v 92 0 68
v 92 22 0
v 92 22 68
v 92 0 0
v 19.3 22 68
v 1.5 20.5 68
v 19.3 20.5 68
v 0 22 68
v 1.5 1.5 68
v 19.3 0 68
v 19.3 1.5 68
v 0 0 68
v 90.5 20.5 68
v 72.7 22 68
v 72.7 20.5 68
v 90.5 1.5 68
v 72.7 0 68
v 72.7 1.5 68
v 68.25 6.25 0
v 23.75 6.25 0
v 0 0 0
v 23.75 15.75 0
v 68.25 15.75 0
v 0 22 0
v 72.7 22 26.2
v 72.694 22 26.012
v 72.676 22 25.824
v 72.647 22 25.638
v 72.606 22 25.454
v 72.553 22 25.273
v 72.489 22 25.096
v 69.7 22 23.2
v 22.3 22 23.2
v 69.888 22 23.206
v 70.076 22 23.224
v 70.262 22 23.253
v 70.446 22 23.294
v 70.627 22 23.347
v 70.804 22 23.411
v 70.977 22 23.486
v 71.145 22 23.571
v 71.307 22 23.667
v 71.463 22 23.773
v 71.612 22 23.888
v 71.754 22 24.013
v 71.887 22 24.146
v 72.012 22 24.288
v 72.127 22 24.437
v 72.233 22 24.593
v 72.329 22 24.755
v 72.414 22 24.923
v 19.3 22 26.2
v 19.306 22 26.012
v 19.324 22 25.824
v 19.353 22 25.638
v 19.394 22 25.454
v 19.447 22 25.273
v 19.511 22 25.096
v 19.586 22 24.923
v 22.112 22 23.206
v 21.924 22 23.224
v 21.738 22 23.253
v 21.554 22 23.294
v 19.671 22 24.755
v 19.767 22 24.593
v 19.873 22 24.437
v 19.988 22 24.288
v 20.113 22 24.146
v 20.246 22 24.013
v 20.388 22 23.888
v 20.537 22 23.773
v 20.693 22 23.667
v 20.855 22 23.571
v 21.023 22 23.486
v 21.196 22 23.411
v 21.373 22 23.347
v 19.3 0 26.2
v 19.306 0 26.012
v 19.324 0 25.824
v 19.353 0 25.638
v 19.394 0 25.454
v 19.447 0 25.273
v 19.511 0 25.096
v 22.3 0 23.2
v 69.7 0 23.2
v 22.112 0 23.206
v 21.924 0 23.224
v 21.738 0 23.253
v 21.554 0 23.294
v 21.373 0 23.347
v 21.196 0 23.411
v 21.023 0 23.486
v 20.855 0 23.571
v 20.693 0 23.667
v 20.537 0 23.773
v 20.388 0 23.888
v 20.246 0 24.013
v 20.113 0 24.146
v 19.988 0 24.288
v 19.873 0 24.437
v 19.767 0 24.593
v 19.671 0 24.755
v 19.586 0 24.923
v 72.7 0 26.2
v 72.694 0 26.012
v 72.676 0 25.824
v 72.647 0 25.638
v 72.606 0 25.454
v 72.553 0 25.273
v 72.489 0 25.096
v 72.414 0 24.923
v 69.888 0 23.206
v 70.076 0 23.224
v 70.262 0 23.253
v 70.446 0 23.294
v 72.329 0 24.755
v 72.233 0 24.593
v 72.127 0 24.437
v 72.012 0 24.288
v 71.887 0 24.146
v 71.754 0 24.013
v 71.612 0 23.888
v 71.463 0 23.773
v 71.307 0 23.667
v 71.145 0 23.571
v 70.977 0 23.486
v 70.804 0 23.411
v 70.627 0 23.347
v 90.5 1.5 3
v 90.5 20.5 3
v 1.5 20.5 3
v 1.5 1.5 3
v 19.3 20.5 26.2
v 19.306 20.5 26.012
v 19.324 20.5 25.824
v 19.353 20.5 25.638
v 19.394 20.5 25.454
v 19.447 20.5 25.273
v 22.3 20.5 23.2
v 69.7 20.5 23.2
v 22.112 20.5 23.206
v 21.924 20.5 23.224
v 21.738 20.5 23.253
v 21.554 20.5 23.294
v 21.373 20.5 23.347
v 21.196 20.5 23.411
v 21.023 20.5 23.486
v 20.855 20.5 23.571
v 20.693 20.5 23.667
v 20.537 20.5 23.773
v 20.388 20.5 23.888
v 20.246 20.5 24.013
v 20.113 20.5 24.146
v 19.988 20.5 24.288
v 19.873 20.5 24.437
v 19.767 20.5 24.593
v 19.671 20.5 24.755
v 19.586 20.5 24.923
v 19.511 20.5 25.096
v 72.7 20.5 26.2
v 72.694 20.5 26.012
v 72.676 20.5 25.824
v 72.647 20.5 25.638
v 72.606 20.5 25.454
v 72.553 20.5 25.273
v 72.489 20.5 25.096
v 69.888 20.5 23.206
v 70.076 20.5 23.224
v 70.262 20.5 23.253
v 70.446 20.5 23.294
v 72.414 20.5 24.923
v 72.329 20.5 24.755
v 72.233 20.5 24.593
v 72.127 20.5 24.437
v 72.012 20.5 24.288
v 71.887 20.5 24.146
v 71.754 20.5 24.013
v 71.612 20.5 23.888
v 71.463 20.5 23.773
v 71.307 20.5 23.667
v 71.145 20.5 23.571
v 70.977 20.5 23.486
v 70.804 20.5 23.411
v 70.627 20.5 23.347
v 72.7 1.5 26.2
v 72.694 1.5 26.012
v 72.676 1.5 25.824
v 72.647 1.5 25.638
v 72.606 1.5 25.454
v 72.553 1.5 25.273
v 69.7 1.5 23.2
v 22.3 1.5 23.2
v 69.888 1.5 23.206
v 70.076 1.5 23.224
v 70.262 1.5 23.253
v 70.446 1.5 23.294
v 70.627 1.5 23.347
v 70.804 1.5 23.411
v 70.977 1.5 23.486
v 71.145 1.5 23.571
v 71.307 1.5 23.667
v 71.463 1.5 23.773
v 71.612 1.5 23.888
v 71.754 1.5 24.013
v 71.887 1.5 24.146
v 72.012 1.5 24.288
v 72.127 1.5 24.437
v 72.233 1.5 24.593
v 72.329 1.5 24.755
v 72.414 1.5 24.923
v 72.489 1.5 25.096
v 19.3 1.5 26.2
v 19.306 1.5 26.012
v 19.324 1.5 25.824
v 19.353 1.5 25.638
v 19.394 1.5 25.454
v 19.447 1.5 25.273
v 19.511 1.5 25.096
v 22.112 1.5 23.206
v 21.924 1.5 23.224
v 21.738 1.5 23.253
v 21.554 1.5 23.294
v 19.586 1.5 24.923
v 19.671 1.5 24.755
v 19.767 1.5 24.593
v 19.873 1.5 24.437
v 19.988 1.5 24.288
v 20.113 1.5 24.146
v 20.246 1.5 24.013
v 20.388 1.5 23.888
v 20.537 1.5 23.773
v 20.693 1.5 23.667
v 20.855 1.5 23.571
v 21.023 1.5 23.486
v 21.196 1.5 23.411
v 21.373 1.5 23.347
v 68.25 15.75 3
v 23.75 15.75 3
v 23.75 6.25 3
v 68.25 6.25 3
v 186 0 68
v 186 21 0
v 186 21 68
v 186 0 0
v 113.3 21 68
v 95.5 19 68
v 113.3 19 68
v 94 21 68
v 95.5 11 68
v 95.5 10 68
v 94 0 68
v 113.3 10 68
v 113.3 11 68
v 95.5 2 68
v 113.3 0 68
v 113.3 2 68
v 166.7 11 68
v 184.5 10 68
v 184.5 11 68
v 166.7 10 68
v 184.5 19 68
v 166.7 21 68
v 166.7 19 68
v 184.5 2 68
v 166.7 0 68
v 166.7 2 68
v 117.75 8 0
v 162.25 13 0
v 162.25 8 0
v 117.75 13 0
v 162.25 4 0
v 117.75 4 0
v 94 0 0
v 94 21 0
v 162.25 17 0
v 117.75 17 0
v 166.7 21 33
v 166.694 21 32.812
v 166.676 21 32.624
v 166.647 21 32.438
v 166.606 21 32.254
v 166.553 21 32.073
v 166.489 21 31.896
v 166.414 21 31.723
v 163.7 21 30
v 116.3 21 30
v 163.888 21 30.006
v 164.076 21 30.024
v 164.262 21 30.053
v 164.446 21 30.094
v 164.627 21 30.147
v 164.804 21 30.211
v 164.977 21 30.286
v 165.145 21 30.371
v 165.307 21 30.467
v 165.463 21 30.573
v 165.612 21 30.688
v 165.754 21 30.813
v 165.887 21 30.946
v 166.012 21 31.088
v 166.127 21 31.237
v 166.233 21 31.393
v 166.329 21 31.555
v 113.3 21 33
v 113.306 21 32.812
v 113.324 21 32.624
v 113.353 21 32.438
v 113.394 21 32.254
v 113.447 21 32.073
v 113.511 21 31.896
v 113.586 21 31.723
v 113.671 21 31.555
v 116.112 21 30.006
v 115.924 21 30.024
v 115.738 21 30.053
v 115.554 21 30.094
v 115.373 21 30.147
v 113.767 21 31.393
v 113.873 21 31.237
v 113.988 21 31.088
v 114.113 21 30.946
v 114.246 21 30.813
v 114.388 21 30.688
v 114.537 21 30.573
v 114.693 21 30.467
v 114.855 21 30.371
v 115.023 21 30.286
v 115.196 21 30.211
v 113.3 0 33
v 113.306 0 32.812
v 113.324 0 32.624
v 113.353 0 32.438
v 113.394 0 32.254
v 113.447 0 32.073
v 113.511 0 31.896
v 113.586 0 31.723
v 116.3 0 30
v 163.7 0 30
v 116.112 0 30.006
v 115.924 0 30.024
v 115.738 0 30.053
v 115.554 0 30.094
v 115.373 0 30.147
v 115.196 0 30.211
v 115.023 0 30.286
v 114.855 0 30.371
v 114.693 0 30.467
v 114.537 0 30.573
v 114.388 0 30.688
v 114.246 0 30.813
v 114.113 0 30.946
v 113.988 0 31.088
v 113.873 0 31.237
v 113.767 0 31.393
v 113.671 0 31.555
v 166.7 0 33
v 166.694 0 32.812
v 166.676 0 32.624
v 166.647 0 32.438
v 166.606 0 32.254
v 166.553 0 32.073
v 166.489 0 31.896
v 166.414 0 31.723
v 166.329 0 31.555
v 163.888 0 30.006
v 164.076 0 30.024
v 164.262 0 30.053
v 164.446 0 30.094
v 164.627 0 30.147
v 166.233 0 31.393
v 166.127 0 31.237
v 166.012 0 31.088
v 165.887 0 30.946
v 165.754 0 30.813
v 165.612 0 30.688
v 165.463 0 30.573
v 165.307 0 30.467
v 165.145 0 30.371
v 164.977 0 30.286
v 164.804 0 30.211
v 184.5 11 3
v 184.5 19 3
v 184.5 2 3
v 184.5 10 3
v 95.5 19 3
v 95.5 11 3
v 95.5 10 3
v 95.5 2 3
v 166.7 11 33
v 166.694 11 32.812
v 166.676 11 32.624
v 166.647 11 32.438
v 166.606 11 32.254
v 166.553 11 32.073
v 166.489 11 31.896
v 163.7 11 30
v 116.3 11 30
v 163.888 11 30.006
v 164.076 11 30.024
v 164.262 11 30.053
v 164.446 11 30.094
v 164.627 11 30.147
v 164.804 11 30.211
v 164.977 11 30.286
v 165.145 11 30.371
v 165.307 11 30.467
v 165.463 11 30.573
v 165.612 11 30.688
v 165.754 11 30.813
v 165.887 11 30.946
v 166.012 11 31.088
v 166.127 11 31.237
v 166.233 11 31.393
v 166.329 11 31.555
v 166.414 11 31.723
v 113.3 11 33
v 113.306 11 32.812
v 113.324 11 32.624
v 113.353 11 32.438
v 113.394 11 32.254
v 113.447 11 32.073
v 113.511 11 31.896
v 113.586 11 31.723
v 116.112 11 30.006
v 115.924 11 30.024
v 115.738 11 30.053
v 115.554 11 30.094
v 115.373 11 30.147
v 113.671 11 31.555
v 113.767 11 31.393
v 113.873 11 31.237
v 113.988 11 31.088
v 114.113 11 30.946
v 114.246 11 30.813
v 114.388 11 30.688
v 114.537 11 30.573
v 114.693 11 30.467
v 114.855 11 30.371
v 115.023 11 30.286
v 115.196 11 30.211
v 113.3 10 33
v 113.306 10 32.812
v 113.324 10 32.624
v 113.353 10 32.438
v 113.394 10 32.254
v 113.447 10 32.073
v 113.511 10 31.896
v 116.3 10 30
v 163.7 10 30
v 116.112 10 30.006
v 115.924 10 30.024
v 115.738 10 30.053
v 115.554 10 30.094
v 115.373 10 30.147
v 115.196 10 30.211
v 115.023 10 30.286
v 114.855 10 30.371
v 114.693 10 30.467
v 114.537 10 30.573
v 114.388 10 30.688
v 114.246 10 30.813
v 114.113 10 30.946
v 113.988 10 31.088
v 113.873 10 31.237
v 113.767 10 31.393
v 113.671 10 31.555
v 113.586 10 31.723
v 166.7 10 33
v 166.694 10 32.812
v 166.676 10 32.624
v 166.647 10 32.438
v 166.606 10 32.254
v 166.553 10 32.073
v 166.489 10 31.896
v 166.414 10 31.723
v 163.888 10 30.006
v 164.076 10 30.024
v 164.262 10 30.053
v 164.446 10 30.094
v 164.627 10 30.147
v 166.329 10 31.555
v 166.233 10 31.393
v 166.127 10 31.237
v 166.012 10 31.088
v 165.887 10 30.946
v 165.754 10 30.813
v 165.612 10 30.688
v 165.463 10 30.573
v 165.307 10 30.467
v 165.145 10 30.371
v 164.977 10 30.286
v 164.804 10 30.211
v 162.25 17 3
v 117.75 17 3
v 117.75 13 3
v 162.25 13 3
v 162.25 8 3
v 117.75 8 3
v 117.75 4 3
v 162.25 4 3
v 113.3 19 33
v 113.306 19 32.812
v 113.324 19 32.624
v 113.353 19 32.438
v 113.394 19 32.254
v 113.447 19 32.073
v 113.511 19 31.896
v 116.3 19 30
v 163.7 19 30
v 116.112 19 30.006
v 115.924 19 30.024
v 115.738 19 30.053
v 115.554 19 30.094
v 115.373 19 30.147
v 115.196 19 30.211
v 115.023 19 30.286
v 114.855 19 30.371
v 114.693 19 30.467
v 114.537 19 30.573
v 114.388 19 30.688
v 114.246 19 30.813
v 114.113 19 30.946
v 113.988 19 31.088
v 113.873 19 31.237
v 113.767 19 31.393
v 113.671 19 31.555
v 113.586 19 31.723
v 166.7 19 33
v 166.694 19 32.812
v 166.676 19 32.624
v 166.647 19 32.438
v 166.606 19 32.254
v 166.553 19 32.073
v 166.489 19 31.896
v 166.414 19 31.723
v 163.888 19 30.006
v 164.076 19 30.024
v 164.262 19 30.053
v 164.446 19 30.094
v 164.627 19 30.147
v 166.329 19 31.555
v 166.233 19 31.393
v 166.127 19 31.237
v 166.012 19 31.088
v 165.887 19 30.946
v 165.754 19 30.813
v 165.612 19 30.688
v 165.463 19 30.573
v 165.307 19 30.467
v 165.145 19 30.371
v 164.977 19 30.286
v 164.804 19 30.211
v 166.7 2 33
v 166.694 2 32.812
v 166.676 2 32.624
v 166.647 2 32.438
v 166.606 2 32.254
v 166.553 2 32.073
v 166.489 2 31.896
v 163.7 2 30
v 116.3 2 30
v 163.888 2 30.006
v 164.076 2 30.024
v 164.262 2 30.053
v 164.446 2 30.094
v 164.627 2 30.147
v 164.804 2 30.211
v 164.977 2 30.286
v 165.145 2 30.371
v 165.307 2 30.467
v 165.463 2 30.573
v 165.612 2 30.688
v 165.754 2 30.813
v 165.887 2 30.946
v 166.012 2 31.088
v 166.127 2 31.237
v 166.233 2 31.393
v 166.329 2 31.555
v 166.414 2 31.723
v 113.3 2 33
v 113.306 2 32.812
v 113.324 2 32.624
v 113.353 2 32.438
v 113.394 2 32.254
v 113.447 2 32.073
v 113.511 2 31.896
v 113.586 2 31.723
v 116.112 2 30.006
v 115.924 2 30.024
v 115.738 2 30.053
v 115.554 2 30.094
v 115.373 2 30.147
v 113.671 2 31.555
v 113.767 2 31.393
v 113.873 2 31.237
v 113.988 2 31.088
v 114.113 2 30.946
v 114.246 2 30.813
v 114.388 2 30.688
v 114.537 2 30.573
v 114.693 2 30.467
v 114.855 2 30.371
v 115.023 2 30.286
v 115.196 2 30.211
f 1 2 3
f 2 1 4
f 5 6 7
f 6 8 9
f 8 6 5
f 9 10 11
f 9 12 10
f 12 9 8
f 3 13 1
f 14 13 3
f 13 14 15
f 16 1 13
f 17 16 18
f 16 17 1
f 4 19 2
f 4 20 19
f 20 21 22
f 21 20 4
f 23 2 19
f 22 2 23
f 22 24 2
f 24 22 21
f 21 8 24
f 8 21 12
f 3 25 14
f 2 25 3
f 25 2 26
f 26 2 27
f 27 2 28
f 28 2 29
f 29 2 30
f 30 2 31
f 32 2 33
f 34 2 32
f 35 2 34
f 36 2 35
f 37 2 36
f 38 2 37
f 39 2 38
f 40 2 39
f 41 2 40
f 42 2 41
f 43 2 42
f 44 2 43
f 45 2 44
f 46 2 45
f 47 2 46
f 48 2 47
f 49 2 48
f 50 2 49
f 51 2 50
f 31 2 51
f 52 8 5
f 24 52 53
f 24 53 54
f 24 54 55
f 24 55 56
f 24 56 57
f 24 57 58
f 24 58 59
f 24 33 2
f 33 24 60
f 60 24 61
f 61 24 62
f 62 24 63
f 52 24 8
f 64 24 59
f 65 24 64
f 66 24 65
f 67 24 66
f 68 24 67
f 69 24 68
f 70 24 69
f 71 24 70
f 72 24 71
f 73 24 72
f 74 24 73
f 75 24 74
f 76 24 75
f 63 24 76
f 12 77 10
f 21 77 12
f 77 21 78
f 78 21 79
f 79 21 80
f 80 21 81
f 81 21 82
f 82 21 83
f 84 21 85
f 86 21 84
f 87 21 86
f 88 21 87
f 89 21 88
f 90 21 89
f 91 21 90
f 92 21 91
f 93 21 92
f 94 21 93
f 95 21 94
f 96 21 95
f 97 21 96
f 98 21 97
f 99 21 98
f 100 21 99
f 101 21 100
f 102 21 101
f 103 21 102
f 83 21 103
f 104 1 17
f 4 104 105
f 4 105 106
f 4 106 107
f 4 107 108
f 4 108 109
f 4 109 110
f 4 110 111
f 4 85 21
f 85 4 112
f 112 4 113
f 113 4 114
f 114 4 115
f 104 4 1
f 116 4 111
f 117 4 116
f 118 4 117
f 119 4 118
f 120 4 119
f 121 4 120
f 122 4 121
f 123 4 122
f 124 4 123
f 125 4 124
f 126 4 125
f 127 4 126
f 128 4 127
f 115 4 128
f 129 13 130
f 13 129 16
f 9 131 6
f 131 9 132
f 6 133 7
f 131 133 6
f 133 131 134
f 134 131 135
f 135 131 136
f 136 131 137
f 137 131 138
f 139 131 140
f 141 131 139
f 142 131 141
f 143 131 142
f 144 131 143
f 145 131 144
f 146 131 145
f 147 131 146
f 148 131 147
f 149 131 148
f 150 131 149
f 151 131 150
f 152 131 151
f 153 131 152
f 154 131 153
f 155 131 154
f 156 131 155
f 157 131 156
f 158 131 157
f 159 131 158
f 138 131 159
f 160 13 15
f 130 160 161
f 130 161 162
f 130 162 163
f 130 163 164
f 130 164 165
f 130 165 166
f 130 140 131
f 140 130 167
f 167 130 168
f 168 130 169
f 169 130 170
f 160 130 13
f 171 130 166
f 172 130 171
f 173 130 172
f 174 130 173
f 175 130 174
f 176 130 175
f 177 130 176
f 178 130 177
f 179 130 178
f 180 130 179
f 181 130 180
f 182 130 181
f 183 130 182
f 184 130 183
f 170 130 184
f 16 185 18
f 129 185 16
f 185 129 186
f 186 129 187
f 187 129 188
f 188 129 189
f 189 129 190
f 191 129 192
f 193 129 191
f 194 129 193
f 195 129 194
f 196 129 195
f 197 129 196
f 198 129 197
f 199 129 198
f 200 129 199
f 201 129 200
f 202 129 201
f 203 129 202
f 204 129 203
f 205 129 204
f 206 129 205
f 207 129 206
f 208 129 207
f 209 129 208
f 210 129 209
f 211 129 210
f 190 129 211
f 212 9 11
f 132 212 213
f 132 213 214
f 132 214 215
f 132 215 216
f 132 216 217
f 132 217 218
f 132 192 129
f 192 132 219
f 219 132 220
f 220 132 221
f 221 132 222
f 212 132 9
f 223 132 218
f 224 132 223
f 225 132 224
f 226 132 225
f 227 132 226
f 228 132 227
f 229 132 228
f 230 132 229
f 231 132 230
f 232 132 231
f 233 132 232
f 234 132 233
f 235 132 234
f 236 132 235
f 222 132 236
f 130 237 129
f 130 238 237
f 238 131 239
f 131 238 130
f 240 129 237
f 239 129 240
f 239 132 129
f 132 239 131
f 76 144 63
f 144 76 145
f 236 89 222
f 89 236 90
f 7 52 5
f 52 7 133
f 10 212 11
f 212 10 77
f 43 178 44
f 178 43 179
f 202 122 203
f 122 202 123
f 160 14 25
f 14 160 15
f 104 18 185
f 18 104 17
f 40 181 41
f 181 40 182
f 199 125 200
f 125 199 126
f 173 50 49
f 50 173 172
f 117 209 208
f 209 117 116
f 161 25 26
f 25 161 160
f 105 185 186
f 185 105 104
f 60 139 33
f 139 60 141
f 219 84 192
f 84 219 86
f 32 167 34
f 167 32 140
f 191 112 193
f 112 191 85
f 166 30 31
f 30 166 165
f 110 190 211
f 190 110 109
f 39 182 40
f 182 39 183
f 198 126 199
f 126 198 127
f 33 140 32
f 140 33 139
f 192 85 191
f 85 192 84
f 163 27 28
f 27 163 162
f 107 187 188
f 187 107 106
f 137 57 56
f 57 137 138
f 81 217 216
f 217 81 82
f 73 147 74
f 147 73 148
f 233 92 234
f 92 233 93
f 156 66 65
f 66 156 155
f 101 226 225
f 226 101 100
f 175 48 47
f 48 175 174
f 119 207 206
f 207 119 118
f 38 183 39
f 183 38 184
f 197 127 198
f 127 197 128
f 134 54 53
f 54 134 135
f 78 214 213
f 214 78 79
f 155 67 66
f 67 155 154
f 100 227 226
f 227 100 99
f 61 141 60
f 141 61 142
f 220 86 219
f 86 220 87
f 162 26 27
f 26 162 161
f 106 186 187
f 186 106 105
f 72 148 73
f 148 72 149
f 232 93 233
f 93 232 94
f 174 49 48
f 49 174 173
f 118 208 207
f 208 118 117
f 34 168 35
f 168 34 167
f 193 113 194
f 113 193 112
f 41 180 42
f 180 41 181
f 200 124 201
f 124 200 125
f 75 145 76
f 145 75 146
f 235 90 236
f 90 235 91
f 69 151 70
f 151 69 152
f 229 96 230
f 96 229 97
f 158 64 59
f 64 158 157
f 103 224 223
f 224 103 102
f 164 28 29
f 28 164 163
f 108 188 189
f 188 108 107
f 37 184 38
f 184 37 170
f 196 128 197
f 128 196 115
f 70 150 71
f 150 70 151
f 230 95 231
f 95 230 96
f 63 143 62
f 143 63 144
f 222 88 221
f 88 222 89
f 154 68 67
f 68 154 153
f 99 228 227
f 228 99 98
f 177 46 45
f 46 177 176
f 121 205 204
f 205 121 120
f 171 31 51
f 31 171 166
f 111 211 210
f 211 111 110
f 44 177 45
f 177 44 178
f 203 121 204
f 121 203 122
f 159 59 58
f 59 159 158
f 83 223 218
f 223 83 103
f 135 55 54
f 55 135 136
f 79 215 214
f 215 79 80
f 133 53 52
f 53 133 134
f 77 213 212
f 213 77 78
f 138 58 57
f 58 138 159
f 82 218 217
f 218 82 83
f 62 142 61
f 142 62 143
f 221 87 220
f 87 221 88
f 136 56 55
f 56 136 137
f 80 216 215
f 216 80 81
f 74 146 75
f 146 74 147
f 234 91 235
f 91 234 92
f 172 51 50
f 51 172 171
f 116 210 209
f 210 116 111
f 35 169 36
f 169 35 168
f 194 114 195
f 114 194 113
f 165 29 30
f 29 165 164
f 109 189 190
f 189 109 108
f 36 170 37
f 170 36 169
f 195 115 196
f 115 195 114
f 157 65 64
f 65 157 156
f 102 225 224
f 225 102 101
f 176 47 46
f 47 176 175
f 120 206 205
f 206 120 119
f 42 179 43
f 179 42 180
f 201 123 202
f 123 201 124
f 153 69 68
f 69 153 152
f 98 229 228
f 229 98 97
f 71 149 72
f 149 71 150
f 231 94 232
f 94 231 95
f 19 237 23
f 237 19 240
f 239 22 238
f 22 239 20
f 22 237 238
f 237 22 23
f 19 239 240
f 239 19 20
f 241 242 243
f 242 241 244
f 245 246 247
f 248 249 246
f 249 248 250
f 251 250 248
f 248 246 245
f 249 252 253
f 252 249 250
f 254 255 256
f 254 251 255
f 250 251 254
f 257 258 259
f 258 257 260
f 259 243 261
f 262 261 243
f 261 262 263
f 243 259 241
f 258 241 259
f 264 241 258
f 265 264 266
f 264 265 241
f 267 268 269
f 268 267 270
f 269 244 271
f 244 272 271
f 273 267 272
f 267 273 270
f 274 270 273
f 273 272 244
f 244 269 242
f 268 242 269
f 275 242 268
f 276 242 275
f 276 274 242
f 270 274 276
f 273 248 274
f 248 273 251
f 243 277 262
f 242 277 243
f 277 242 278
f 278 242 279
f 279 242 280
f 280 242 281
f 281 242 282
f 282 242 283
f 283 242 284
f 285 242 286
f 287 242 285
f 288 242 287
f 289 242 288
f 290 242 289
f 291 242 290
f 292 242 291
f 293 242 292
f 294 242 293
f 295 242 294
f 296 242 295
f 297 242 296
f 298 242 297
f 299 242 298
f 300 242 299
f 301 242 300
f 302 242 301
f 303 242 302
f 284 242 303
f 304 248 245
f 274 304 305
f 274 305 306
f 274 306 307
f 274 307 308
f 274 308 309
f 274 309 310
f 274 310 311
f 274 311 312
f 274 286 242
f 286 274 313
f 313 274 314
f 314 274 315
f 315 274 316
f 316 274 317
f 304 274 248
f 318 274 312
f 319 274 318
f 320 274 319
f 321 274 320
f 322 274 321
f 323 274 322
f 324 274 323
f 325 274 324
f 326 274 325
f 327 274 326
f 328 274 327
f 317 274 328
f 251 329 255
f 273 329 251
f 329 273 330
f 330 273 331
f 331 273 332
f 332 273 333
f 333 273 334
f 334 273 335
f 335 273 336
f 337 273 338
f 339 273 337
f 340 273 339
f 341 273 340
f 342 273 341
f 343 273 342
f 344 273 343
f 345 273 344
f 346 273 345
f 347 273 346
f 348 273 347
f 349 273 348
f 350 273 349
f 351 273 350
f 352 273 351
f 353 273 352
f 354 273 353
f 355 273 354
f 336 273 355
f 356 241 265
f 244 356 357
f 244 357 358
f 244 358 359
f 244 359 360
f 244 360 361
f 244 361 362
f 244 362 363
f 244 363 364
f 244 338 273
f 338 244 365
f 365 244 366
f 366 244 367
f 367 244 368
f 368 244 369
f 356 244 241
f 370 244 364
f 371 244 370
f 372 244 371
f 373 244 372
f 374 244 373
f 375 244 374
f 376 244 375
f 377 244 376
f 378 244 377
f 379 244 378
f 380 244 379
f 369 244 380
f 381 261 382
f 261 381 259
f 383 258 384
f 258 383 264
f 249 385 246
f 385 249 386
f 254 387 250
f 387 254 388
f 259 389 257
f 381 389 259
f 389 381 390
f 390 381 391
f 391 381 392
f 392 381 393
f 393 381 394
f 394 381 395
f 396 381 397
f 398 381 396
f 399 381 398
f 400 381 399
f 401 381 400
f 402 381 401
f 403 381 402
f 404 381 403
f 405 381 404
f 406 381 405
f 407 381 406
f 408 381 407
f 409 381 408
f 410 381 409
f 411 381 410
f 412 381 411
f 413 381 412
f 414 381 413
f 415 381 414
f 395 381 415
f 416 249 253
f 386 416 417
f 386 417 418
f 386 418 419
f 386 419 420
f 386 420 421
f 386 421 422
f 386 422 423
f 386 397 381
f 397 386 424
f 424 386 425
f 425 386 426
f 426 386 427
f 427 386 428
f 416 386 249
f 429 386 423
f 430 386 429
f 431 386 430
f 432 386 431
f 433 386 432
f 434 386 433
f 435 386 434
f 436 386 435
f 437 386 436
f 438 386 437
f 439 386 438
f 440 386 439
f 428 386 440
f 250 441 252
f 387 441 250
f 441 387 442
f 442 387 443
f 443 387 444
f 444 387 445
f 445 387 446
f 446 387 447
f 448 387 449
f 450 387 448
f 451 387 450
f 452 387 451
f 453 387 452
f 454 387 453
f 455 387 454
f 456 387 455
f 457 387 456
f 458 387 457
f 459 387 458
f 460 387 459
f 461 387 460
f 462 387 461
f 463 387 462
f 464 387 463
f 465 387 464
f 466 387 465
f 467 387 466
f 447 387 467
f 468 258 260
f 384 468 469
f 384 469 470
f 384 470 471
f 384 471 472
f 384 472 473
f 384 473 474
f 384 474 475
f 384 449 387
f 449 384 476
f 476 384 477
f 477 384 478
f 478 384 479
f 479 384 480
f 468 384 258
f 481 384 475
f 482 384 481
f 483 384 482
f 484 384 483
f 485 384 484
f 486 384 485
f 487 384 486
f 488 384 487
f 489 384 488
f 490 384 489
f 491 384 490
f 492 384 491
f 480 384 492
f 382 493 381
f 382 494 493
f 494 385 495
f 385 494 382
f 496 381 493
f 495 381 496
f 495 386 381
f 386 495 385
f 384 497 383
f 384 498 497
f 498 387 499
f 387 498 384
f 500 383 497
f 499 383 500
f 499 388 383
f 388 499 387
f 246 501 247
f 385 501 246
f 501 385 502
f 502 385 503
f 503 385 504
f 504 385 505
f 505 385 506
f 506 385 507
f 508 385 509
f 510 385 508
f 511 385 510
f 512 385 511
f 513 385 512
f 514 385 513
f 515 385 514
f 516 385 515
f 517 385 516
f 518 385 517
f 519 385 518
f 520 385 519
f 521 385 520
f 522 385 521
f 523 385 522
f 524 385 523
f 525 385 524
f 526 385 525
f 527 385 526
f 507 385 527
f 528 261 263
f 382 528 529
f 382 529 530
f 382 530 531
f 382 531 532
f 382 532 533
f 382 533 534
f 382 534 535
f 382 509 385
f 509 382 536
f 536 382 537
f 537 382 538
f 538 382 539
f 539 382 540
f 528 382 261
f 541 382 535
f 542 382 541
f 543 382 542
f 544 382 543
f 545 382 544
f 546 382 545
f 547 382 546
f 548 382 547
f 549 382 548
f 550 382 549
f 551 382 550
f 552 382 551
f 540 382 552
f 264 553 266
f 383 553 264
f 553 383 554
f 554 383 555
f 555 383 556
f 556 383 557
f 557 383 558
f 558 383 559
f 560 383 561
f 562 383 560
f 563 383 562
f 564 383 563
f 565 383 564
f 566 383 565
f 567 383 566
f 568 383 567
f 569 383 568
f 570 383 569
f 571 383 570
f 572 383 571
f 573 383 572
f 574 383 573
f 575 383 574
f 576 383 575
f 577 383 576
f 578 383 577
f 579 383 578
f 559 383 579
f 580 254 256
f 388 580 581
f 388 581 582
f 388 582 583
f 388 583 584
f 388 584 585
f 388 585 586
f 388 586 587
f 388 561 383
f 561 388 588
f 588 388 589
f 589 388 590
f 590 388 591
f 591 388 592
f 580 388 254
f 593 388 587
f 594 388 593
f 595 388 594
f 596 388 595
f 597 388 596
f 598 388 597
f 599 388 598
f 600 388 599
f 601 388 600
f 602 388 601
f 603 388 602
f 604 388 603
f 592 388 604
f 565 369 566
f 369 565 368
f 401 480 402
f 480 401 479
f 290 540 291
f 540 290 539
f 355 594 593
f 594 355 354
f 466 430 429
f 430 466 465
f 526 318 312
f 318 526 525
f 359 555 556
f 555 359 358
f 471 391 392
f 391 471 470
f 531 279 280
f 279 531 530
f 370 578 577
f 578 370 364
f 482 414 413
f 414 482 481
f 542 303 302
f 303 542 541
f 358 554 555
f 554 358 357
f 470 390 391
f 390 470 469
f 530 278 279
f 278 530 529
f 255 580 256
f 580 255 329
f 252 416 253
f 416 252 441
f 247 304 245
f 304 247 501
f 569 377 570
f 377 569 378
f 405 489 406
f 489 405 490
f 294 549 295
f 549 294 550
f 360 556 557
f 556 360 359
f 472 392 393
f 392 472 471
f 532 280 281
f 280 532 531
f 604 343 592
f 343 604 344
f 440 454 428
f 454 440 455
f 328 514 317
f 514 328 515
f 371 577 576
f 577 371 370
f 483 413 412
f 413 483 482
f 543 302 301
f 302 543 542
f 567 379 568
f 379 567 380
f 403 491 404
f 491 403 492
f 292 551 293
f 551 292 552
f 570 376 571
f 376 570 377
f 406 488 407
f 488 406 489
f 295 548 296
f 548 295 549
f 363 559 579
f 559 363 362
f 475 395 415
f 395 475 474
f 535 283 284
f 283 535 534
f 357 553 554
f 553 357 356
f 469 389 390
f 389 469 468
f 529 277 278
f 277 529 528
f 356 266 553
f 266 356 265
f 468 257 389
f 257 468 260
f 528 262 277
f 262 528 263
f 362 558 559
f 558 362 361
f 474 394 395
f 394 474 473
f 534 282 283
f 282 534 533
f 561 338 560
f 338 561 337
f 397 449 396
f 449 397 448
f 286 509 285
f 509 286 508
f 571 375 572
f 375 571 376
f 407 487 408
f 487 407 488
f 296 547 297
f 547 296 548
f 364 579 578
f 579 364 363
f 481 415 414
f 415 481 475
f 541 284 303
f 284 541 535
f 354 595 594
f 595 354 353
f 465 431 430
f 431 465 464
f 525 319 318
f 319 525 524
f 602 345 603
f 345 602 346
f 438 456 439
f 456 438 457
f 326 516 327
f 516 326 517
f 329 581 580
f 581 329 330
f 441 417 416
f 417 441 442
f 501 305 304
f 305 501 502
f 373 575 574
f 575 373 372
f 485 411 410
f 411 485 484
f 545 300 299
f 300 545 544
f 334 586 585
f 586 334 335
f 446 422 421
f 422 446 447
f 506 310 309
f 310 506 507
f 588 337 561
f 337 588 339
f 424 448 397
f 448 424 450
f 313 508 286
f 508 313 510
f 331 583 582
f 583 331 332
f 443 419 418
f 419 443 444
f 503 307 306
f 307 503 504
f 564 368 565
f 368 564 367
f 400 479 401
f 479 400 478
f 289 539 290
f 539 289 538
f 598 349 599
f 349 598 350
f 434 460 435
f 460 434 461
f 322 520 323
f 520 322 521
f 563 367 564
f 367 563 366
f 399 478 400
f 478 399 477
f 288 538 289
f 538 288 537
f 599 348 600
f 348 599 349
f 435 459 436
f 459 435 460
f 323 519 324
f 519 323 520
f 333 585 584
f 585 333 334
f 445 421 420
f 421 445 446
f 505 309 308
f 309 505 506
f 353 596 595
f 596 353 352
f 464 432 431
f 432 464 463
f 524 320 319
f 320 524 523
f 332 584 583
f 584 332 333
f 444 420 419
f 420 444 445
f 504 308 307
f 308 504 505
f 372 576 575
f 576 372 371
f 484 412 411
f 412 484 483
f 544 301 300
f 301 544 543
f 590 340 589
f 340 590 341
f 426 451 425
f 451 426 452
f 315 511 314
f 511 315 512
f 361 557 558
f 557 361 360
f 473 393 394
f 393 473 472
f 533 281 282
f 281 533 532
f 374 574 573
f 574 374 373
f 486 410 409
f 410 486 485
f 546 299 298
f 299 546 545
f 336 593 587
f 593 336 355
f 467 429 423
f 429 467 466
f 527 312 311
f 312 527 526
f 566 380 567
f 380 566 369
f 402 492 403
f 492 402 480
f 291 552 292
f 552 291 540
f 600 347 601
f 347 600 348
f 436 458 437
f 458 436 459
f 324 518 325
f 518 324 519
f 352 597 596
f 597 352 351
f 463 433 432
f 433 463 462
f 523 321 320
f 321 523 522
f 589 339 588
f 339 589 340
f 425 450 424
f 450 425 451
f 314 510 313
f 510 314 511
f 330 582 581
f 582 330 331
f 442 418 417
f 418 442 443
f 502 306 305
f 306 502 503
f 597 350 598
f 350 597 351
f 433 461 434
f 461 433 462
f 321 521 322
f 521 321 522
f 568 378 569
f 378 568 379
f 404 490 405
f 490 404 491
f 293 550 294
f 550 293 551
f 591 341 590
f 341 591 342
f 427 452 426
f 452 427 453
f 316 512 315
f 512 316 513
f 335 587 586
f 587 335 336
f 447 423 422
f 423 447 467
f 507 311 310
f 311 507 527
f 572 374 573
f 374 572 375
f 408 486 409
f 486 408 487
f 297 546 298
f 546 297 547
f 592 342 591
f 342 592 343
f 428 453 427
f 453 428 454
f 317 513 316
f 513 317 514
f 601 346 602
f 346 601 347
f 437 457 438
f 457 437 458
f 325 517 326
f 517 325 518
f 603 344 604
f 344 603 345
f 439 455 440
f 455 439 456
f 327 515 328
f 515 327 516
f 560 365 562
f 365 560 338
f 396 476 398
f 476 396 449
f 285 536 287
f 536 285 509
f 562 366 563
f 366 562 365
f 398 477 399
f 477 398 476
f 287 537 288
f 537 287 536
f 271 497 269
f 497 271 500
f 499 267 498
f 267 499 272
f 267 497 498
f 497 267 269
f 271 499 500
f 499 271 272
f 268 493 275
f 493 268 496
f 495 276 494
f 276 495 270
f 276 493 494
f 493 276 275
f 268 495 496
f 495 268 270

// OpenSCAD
include <lib/boardgame_insert_toolkit_lib.2.scad>;

// determines whether lids are output.
g_b_print_lid = true;

// determines whether boxes are output.
g_b_print_box = true; 

// Focus on one box
g_isolated_print_box = ""; 

// Used to visualize how all of the boxes fit together. 
g_b_visualization = false;          
        
// this is the outer wall thickness. 
//Default = 1.5mm
g_wall_thickness = 1.5;

// The tolerance value is extra space put between planes of the lid and box that fit together.
// Increase the tolerance to loosen the fit and decrease it to tighten it.
//
// Note that the tolerance is applied exclusively to the lid.
// So if the lid is too tight or too loose, change this value ( up for looser fit, down for tighter fit ) and 
// you only need to reprint the lid.
// 
// The exception is the stackable box, where the bottom of the box is the lid of the box below,
// in which case the tolerance also affects that box bottom.
//
g_tolerance = 0.15;

// This adjusts the position of the lid detents downward. 
// The larger the value, the bigger the gap between the lid and the box.
g_tolerance_detents_pos = 0.1;

// This determines whether the default single material version is output, or, if printing in multiple materials, 
// which layer to output.
//
g_print_mmu_layer = "default"; // [ "default" | "mmu_box_layer" | "mmu_label_layer" ]

data =
[


    [   "card tray - missions",
        [
            [ BOX_SIZE_XYZ,[92.0, 22.0, 68.0] ],
            [ BOX_NO_LID_B,
                [
                    [ ],
                ]
            ],
            [ BOX_COMPONENT,
                [
                    [ CMP_SHAPE, SQUARE ],
                    [ CMP_COMPARTMENT_SIZE_XYZ, [ 89, 19, 65.0] ],
                    [ CMP_CUTOUT_SIDES_4B, [t,t,f,f]],
                    [ CMP_CUTOUT_HEIGHT_PCT, 60 ],
                    [ CMP_CUTOUT_WIDTH_PCT, 60 ],
                    [ CMP_CUTOUT_TYPE, BOTH ],
                    [ CMP_CUTOUT_BOTTOM_B, t ],
                    [ CMP_CUTOUT_BOTTOM_PCT, 50 ],
                ]
            ],

        ]
    ],
    [   "card tray - omega, ereigniskarten, solo",
        [
            [ BOX_SIZE_XYZ,[92.0, 21.0, 68.0] ],
            [ BOX_NO_LID_B,
                [
                    [ ],
                ]
            ],
            [ BOX_COMPONENT,
                [
                    [ CMP_SHAPE, SQUARE ],
                    [ CMP_NUM_COMPARTMENTS_XY, [1, 2] ],
                    [ CMP_COMPARTMENT_SIZE_XYZ, [ 89, 8, 65.0] ],
                    [ CMP_CUTOUT_SIDES_4B, [t,t,f,f]],
                    [ CMP_CUTOUT_HEIGHT_PCT, 50 ],
                    [ CMP_CUTOUT_WIDTH_PCT, 60 ],
                    [ CMP_CUTOUT_TYPE, BOTH ],
                    [ CMP_CUTOUT_BOTTOM_B, t ],
                    [ CMP_CUTOUT_BOTTOM_PCT, 50 ],
                ]
            ],

        ]
    ],
];


MakeAll();
